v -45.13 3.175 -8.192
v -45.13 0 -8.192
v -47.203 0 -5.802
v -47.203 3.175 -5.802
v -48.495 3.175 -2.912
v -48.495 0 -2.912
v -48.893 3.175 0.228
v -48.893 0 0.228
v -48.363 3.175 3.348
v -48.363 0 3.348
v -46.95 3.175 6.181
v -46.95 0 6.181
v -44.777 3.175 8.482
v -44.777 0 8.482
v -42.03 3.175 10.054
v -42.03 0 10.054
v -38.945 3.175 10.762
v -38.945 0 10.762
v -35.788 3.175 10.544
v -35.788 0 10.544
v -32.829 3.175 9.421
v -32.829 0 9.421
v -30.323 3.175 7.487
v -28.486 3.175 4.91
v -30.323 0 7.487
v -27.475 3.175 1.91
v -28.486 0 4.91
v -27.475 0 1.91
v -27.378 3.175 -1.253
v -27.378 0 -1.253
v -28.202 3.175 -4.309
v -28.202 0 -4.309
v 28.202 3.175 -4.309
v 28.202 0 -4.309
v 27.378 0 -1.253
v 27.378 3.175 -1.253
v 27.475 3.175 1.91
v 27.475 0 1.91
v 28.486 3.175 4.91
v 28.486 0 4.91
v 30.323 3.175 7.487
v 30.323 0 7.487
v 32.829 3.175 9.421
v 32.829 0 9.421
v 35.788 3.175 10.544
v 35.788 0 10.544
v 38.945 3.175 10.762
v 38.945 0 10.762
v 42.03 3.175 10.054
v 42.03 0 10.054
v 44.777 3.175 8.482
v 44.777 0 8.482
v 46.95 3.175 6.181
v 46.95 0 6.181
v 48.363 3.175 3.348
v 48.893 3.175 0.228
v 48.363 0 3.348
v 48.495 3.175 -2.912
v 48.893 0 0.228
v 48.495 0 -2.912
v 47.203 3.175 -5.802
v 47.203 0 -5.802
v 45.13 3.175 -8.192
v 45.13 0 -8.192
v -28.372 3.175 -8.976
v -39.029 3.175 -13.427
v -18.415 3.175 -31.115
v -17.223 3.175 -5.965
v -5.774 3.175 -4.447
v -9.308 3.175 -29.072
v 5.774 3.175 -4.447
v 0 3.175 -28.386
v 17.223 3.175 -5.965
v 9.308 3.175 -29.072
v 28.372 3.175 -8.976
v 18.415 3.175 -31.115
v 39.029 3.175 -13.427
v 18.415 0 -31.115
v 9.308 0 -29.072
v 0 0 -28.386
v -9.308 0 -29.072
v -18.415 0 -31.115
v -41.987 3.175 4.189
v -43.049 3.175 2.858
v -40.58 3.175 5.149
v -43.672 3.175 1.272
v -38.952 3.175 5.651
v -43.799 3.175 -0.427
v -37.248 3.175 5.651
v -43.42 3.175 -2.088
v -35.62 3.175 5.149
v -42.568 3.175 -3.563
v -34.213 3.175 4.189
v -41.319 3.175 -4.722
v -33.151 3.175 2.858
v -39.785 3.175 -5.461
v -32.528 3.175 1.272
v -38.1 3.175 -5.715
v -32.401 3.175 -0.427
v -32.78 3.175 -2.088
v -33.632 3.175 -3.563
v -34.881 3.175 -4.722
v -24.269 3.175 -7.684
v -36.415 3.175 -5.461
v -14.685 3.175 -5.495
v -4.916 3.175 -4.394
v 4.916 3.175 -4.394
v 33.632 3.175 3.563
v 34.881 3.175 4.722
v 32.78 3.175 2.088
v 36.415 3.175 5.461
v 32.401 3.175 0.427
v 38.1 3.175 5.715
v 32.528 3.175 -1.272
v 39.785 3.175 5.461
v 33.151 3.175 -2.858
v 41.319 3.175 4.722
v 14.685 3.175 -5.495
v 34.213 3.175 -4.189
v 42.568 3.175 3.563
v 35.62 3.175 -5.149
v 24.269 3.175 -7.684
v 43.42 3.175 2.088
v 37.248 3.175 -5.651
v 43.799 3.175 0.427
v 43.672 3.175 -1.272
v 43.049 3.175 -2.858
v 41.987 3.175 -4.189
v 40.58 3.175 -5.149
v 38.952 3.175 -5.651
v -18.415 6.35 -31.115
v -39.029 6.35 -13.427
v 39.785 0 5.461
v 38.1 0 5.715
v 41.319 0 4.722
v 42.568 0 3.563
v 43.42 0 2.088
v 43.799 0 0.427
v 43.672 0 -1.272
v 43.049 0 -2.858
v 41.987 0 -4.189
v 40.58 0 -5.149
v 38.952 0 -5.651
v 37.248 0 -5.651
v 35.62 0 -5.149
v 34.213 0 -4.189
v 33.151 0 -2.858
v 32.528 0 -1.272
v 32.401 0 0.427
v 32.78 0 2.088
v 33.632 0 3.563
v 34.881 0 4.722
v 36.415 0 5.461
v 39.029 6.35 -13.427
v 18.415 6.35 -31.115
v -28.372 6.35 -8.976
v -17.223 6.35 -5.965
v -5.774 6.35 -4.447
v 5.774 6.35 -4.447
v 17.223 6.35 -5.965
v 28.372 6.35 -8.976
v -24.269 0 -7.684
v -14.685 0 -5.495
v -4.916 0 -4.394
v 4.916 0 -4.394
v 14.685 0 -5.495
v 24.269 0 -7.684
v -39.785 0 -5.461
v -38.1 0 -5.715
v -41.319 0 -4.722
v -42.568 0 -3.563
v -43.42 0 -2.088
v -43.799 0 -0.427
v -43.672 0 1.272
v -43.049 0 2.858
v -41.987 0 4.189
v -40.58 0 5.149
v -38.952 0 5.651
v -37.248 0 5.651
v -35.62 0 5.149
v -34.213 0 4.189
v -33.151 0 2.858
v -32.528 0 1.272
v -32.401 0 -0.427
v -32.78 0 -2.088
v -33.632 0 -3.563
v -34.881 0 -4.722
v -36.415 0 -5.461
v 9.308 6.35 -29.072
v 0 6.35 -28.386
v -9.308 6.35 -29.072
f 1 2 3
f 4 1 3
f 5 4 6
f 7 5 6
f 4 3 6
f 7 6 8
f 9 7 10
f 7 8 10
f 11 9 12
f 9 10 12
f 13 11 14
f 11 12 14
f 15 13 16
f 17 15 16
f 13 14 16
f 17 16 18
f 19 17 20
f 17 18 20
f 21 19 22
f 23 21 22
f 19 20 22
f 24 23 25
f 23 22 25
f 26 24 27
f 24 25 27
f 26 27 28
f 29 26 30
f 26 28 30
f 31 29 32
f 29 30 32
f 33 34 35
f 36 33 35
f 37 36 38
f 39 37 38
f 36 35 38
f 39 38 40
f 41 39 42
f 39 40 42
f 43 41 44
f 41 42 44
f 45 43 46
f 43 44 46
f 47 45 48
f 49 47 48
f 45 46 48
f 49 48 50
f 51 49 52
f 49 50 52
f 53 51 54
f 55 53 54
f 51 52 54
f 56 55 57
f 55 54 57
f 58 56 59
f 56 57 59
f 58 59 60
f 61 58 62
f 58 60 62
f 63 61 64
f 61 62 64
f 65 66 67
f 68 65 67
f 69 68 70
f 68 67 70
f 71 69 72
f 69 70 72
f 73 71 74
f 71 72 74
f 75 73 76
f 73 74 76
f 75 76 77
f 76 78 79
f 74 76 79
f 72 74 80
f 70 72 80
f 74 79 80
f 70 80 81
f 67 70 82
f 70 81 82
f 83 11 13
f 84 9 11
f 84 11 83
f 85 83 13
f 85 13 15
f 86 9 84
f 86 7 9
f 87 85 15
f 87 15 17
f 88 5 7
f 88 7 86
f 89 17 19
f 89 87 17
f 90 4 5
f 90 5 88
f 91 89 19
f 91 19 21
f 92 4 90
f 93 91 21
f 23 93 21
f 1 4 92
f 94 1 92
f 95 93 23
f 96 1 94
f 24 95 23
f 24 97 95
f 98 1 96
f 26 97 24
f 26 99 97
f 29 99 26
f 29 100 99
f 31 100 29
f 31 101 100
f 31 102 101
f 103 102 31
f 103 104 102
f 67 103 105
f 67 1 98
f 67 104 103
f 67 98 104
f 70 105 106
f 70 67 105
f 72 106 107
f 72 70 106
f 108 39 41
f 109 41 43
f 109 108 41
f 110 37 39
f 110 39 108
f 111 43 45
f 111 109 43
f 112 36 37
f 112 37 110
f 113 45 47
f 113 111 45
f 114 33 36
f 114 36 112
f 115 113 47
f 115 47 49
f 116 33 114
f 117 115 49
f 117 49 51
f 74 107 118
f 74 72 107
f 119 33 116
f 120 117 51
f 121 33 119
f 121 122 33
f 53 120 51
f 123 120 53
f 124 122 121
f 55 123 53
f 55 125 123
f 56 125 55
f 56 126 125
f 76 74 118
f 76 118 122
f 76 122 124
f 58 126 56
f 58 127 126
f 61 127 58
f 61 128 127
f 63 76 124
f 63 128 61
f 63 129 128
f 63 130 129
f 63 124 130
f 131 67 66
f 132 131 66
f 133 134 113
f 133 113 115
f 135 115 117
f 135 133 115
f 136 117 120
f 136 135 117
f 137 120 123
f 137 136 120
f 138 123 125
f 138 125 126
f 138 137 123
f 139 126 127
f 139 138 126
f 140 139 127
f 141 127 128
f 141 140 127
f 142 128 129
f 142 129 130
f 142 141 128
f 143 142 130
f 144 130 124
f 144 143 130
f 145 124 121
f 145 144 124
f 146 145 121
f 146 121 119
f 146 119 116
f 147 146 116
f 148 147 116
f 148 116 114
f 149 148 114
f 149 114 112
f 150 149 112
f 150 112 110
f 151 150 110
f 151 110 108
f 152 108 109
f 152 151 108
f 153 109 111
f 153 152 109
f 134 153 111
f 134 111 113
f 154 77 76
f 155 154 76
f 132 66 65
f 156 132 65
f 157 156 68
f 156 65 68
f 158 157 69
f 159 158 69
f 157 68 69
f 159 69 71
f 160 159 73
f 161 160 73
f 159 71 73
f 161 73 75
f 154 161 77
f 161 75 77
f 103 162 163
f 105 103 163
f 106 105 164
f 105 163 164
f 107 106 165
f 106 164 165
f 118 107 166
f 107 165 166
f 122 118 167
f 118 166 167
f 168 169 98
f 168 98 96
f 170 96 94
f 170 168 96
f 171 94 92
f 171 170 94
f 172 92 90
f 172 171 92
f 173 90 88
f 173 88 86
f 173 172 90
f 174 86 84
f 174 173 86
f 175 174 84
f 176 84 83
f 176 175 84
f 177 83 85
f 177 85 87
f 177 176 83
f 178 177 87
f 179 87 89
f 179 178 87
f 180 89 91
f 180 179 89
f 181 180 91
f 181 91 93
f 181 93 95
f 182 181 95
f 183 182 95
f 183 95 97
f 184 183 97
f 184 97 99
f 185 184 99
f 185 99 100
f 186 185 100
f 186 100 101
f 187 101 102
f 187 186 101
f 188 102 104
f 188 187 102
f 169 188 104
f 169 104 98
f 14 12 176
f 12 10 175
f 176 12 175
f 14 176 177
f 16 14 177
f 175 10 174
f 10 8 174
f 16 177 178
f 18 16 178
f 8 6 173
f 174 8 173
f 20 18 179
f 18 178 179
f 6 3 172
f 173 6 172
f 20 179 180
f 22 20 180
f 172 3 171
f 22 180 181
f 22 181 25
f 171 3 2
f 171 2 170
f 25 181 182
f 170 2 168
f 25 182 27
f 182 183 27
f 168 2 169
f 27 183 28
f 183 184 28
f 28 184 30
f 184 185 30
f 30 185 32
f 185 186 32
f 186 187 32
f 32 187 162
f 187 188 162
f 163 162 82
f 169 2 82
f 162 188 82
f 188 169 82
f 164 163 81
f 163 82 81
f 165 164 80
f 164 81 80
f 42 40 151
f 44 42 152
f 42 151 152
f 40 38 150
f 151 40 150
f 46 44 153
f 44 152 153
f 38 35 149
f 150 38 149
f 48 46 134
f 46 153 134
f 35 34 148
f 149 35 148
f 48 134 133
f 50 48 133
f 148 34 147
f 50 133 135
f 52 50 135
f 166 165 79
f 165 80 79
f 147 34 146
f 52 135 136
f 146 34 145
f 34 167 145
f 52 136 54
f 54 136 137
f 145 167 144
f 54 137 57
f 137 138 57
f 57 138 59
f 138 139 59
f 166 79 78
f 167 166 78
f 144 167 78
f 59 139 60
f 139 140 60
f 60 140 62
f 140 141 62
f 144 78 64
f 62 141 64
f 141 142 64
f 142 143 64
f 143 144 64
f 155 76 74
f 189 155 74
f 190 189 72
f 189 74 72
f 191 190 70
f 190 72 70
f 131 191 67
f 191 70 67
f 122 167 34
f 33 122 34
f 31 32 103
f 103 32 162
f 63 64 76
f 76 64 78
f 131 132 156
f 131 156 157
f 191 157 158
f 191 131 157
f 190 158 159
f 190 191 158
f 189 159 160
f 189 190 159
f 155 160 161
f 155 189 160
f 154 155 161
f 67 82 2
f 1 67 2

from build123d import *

# Parameters (mm, degrees)
SKETCH1_R           = 5.715
BOSS_EXTRUDE1_DEPTH = 3.175
BOSS_EXTRUDE2_DEPTH = 3.175


with BuildPart() as part:
    # Sketch1 → Boss-Extrude1 (new body)
    with BuildSketch(Plane(origin=(0, 0, 0), x_dir=(1, 0, 0), z_dir=(0, 1, 0))):
        with BuildLine():
            Line((45.129586045, 8.192493212), (18.415, 31.115))
            ThreePointArc((18.415, 31.115), (0, 28.386191983), (-18.415, 31.115))
            Line((-18.415, 31.115), (-45.129586045, 8.192493212))
            ThreePointArc((-45.129586045, 8.192493212), (-40.513842398, -10.521662886), (-28.202341812, 4.309105173))
            Line((-28.202341812, 4.309105173), (-24.269223655, 7.683925486))
            ThreePointArc((-24.269223655, 7.683925486), (0, 4.256191983), (24.269223655, 7.683925486))
            Line((24.269223655, 7.683925486), (28.202341812, 4.309105173))
            ThreePointArc((28.202341812, 4.309105173), (40.513842398, -10.521662886), (45.129586045, 8.192493212))
        make_face()
        with Locations(Location((38.1, 0, 0), (0, 0, 270))):
            Circle(SKETCH1_R, mode=Mode.SUBTRACT)
        with Locations(Location((-38.1, 0, 0), (0, 0, 90))):
            Circle(SKETCH1_R, mode=Mode.SUBTRACT)
    extrude(amount=BOSS_EXTRUDE1_DEPTH)


with BuildPart() as body_2:
    # Sketch2 → Boss-Extrude2 (new body)
    with BuildSketch(Plane(origin=(0, 3.175, 0), x_dir=(1, 0, 0), z_dir=(0, 1, 0))):
        with BuildLine():
            Line((-18.415, 31.115), (-39.028657392, 13.427407885))
            ThreePointArc((-39.028657392, 13.427407885), (0, 4.256191983), (39.028657392, 13.427407885))
            Line((39.028657392, 13.427407885), (18.415, 31.115))
            ThreePointArc((18.415, 31.115), (0, 28.386191983), (-18.415, 31.115))
        make_face()
    extrude(amount=BOSS_EXTRUDE2_DEPTH)


solid = Compound([part.part, body_2.part])
